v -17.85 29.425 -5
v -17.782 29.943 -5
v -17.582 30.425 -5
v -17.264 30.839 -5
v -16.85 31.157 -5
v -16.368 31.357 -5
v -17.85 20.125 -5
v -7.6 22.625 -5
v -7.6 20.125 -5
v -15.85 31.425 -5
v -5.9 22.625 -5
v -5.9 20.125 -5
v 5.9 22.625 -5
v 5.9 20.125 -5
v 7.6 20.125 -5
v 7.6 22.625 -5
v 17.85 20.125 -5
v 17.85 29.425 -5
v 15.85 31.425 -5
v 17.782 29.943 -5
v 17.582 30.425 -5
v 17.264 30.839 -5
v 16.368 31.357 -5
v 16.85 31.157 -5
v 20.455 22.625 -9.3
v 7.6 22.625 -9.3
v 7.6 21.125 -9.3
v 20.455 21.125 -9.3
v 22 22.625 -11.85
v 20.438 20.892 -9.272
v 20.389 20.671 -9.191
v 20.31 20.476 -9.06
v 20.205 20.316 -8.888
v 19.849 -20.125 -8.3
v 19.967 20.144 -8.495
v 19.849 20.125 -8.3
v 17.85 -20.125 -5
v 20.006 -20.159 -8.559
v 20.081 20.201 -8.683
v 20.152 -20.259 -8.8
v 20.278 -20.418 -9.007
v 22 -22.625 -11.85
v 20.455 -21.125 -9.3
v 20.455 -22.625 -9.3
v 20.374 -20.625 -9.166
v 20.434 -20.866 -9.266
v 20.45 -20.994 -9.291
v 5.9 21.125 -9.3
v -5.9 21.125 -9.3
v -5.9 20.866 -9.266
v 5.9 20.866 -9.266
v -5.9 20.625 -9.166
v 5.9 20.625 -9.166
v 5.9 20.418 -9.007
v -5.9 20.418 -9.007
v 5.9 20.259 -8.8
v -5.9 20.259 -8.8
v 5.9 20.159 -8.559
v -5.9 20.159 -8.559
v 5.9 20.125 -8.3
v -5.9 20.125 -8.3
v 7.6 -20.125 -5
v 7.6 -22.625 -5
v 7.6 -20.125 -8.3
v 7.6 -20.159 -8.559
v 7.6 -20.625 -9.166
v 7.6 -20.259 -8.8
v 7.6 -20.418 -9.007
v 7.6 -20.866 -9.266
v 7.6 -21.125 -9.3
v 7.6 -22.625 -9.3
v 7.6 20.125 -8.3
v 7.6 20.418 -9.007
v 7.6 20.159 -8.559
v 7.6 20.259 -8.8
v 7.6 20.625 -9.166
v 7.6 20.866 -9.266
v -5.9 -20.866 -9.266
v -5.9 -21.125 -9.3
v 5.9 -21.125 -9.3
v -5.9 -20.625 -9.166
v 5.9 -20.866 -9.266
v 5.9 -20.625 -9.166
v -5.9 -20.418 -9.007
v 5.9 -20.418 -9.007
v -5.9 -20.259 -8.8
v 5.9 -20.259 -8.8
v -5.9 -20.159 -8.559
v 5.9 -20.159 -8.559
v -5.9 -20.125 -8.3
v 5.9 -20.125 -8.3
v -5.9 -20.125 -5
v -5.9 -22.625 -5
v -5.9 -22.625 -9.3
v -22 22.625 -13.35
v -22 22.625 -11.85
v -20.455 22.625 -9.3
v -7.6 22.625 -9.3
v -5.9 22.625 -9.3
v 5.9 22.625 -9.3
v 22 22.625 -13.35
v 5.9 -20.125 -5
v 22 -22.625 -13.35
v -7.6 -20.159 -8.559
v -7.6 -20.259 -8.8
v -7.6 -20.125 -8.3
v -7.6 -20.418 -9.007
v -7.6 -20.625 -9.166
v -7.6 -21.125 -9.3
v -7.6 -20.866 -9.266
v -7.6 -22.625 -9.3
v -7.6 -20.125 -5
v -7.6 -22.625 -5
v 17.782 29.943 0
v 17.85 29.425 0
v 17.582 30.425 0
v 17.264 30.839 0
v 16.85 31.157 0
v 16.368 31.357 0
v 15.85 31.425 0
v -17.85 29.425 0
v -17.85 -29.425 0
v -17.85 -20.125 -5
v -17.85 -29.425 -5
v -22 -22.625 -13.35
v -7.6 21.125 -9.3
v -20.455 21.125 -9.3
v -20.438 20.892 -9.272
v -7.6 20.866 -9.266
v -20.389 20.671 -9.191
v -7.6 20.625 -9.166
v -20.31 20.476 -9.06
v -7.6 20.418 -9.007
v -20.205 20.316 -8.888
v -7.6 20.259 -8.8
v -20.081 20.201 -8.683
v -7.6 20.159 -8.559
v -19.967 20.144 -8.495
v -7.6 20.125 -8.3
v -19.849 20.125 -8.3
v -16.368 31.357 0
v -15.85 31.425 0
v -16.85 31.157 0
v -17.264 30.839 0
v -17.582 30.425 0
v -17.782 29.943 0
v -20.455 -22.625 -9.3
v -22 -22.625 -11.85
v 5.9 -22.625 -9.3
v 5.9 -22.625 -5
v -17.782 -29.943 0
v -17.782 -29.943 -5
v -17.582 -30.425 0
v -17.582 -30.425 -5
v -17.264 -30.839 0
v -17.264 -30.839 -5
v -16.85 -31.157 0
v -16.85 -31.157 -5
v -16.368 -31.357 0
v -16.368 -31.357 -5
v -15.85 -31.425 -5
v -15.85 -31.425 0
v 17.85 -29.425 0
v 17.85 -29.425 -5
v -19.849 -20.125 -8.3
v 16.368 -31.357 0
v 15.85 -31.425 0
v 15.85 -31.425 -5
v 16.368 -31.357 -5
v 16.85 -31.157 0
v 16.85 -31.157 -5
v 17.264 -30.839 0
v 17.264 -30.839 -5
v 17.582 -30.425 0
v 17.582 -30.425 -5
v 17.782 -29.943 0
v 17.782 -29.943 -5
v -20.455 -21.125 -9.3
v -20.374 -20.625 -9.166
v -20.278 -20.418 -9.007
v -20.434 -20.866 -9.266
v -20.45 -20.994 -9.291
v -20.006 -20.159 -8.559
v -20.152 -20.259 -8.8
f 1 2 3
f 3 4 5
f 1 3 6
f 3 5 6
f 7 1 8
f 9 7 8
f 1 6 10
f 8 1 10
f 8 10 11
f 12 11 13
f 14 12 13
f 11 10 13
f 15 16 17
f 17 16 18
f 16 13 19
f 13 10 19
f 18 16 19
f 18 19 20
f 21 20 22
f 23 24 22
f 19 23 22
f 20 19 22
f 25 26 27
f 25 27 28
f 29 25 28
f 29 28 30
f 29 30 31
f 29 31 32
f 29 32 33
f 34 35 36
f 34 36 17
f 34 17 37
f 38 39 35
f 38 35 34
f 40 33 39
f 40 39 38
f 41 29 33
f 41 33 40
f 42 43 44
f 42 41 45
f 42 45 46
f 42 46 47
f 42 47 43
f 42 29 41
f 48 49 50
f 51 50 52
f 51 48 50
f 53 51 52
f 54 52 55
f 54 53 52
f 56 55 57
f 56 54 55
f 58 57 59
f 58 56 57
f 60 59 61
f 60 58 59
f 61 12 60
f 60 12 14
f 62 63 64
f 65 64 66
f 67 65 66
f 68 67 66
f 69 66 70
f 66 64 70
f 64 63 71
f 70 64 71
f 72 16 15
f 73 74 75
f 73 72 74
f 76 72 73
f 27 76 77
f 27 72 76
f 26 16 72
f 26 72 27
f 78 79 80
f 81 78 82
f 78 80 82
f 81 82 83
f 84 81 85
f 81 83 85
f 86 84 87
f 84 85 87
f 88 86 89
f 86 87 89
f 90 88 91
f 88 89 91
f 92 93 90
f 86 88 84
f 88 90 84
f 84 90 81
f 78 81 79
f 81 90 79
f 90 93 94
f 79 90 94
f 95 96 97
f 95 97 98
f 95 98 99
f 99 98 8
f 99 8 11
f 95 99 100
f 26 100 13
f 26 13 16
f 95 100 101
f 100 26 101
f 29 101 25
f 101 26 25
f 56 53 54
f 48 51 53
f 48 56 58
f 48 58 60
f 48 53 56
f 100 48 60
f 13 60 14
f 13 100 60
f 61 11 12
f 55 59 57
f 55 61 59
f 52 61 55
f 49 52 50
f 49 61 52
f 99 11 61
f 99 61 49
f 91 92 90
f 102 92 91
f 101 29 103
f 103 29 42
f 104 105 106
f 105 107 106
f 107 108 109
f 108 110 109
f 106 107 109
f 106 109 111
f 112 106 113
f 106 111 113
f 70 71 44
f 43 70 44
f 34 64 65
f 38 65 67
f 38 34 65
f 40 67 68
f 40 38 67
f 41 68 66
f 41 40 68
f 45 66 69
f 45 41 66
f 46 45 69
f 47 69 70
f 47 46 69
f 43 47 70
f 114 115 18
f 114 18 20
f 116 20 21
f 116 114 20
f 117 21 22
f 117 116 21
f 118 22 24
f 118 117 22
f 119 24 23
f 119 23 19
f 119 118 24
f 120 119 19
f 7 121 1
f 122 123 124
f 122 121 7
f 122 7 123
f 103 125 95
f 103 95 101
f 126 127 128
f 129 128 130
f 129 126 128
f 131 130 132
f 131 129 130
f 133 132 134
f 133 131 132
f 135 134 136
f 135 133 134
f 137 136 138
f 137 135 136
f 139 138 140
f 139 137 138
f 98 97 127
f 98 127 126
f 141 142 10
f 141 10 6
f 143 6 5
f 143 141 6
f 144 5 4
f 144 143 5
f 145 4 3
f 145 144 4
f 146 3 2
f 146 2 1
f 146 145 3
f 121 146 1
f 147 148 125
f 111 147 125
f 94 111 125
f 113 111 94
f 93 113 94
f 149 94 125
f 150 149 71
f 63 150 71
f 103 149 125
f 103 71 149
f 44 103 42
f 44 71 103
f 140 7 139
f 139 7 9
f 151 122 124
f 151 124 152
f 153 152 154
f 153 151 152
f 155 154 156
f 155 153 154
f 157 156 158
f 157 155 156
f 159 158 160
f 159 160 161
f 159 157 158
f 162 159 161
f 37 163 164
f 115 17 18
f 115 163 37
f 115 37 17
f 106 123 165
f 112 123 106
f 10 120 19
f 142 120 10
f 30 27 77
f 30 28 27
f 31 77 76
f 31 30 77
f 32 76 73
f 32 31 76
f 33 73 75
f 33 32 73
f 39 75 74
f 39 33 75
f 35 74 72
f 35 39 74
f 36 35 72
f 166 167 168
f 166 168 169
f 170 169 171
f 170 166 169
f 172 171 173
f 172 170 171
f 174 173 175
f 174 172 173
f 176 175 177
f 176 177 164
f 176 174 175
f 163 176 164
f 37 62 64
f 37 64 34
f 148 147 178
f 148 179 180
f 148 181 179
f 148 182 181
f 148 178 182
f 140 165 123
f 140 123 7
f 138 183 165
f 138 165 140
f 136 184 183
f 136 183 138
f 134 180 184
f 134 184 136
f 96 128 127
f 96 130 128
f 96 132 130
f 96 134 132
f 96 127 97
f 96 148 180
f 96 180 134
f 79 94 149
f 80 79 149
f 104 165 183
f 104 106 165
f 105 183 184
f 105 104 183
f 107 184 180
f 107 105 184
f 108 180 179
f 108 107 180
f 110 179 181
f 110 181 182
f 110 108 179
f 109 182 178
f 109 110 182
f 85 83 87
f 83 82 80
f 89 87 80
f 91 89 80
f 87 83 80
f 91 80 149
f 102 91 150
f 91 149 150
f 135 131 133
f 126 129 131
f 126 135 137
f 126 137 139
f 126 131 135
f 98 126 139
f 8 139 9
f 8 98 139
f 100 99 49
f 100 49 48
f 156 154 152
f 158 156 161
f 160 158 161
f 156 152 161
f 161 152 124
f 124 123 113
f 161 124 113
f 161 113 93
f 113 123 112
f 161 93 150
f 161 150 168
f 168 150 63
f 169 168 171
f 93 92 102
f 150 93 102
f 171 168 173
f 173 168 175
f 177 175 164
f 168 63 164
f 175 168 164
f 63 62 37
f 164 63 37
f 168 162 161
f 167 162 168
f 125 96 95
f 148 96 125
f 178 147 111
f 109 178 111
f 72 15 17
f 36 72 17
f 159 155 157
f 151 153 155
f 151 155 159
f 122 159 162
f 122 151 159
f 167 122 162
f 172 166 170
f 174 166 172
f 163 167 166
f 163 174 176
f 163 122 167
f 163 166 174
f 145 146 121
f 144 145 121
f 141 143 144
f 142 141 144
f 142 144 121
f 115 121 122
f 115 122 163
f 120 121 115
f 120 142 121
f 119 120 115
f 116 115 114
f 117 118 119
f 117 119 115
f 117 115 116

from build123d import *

# Parameters (mm, degrees)
F1_DEPTH = 5
F2_W     = 35.7
F2_H     = 45.25
F4_W     = 44
F4_H     = 45.25
F6_DEPTH = 1.5
F8_DEPTH = 2.5
F9_R     = 1


# Not quite as in the source:
# - a pattern or mirror of a feature is missing from the dataset's text; its kind, count and spacing are read off the source's solid


with BuildPart() as f1:
    # F0 (on Top) → F1 (new body)
    with BuildSketch(Plane.XY):
        with BuildLine():
            Line((-15.85, -31.425), (15.85, -31.425))
            ThreePointArc((15.85, -31.425), (17.2642135624, -30.8392135624), (17.85, -29.425))
            Line((17.85, -29.425), (17.85, 29.425))
            ThreePointArc((17.85, 29.425), (17.2642135624, 30.8392135624), (15.85, 31.425))
            Line((15.85, 31.425), (-15.85, 31.425))
            ThreePointArc((-15.85, 31.425), (-17.2642135624, 30.8392135624), (-17.85, 29.425))
            Line((-17.85, 29.425), (-17.85, -29.425))
            ThreePointArc((-17.85, -29.425), (-17.2642135624, -30.8392135624), (-15.85, -31.425))
        make_face()
    extrude(amount=-F1_DEPTH)

    # F2 (on face) → F5 section 0
    with BuildSketch(Plane(origin=(0, 0, -5), x_dir=(1, 0, 0), z_dir=(0, 0, -1))):
        Rectangle(F2_W, F2_H)
    # F4 (on offset) → F5 section 1
    with BuildSketch(Plane(origin=(0, 0, -11.85), x_dir=(1, 0, 0), z_dir=(0, 0, -1))):
        Rectangle(F4_W, F4_H)
    loft()

    # F4 (on offset) → F6 (join)
    with BuildSketch(Plane(origin=(0, 0, -11.85), x_dir=(1, 0, 0), z_dir=(0, 0, -1))):
        Rectangle(F4_W, F4_H)
    extrude(amount=F6_DEPTH)

    # F7 (on face) → F8 (cut)
    with BuildSketch(Plane.XZ.offset(22.625)):
        Polygon((5.9, -5), (0, -5), (-5.9, -5), (-5.9, -9.3), (0, -9.3), (5.9, -9.3), align=None)
        Polygon((-7.6, -9.3), (-7.6, -5), (-17.85, -5), (-20.4551094891, -9.3), align=None)
        Polygon((17.85, -5), (7.6, -5), (7.6, -9.3), (20.4551094891, -9.3), align=None)
    f8 = extrude(amount=-F8_DEPTH, mode=Mode.SUBTRACT)

    # F8_copies: F8 across plane
    add(f8.mirror(Plane.ZX), mode=Mode.SUBTRACT)

    # F9
    f9_edges = [f1.edges().sort_by_distance(p)[0] for p in [
        (-14.027555, -20.125, -9.3),
        (0, -20.125, -9.3),
        (14.027555, -20.125, -9.3),
        (14.027555, 20.125, -9.3),
        (0, 20.125, -9.3),
        (-14.027555, 20.125, -9.3),
    ]]
    fillet(f9_edges, radius=F9_R)


solid = f1.part
